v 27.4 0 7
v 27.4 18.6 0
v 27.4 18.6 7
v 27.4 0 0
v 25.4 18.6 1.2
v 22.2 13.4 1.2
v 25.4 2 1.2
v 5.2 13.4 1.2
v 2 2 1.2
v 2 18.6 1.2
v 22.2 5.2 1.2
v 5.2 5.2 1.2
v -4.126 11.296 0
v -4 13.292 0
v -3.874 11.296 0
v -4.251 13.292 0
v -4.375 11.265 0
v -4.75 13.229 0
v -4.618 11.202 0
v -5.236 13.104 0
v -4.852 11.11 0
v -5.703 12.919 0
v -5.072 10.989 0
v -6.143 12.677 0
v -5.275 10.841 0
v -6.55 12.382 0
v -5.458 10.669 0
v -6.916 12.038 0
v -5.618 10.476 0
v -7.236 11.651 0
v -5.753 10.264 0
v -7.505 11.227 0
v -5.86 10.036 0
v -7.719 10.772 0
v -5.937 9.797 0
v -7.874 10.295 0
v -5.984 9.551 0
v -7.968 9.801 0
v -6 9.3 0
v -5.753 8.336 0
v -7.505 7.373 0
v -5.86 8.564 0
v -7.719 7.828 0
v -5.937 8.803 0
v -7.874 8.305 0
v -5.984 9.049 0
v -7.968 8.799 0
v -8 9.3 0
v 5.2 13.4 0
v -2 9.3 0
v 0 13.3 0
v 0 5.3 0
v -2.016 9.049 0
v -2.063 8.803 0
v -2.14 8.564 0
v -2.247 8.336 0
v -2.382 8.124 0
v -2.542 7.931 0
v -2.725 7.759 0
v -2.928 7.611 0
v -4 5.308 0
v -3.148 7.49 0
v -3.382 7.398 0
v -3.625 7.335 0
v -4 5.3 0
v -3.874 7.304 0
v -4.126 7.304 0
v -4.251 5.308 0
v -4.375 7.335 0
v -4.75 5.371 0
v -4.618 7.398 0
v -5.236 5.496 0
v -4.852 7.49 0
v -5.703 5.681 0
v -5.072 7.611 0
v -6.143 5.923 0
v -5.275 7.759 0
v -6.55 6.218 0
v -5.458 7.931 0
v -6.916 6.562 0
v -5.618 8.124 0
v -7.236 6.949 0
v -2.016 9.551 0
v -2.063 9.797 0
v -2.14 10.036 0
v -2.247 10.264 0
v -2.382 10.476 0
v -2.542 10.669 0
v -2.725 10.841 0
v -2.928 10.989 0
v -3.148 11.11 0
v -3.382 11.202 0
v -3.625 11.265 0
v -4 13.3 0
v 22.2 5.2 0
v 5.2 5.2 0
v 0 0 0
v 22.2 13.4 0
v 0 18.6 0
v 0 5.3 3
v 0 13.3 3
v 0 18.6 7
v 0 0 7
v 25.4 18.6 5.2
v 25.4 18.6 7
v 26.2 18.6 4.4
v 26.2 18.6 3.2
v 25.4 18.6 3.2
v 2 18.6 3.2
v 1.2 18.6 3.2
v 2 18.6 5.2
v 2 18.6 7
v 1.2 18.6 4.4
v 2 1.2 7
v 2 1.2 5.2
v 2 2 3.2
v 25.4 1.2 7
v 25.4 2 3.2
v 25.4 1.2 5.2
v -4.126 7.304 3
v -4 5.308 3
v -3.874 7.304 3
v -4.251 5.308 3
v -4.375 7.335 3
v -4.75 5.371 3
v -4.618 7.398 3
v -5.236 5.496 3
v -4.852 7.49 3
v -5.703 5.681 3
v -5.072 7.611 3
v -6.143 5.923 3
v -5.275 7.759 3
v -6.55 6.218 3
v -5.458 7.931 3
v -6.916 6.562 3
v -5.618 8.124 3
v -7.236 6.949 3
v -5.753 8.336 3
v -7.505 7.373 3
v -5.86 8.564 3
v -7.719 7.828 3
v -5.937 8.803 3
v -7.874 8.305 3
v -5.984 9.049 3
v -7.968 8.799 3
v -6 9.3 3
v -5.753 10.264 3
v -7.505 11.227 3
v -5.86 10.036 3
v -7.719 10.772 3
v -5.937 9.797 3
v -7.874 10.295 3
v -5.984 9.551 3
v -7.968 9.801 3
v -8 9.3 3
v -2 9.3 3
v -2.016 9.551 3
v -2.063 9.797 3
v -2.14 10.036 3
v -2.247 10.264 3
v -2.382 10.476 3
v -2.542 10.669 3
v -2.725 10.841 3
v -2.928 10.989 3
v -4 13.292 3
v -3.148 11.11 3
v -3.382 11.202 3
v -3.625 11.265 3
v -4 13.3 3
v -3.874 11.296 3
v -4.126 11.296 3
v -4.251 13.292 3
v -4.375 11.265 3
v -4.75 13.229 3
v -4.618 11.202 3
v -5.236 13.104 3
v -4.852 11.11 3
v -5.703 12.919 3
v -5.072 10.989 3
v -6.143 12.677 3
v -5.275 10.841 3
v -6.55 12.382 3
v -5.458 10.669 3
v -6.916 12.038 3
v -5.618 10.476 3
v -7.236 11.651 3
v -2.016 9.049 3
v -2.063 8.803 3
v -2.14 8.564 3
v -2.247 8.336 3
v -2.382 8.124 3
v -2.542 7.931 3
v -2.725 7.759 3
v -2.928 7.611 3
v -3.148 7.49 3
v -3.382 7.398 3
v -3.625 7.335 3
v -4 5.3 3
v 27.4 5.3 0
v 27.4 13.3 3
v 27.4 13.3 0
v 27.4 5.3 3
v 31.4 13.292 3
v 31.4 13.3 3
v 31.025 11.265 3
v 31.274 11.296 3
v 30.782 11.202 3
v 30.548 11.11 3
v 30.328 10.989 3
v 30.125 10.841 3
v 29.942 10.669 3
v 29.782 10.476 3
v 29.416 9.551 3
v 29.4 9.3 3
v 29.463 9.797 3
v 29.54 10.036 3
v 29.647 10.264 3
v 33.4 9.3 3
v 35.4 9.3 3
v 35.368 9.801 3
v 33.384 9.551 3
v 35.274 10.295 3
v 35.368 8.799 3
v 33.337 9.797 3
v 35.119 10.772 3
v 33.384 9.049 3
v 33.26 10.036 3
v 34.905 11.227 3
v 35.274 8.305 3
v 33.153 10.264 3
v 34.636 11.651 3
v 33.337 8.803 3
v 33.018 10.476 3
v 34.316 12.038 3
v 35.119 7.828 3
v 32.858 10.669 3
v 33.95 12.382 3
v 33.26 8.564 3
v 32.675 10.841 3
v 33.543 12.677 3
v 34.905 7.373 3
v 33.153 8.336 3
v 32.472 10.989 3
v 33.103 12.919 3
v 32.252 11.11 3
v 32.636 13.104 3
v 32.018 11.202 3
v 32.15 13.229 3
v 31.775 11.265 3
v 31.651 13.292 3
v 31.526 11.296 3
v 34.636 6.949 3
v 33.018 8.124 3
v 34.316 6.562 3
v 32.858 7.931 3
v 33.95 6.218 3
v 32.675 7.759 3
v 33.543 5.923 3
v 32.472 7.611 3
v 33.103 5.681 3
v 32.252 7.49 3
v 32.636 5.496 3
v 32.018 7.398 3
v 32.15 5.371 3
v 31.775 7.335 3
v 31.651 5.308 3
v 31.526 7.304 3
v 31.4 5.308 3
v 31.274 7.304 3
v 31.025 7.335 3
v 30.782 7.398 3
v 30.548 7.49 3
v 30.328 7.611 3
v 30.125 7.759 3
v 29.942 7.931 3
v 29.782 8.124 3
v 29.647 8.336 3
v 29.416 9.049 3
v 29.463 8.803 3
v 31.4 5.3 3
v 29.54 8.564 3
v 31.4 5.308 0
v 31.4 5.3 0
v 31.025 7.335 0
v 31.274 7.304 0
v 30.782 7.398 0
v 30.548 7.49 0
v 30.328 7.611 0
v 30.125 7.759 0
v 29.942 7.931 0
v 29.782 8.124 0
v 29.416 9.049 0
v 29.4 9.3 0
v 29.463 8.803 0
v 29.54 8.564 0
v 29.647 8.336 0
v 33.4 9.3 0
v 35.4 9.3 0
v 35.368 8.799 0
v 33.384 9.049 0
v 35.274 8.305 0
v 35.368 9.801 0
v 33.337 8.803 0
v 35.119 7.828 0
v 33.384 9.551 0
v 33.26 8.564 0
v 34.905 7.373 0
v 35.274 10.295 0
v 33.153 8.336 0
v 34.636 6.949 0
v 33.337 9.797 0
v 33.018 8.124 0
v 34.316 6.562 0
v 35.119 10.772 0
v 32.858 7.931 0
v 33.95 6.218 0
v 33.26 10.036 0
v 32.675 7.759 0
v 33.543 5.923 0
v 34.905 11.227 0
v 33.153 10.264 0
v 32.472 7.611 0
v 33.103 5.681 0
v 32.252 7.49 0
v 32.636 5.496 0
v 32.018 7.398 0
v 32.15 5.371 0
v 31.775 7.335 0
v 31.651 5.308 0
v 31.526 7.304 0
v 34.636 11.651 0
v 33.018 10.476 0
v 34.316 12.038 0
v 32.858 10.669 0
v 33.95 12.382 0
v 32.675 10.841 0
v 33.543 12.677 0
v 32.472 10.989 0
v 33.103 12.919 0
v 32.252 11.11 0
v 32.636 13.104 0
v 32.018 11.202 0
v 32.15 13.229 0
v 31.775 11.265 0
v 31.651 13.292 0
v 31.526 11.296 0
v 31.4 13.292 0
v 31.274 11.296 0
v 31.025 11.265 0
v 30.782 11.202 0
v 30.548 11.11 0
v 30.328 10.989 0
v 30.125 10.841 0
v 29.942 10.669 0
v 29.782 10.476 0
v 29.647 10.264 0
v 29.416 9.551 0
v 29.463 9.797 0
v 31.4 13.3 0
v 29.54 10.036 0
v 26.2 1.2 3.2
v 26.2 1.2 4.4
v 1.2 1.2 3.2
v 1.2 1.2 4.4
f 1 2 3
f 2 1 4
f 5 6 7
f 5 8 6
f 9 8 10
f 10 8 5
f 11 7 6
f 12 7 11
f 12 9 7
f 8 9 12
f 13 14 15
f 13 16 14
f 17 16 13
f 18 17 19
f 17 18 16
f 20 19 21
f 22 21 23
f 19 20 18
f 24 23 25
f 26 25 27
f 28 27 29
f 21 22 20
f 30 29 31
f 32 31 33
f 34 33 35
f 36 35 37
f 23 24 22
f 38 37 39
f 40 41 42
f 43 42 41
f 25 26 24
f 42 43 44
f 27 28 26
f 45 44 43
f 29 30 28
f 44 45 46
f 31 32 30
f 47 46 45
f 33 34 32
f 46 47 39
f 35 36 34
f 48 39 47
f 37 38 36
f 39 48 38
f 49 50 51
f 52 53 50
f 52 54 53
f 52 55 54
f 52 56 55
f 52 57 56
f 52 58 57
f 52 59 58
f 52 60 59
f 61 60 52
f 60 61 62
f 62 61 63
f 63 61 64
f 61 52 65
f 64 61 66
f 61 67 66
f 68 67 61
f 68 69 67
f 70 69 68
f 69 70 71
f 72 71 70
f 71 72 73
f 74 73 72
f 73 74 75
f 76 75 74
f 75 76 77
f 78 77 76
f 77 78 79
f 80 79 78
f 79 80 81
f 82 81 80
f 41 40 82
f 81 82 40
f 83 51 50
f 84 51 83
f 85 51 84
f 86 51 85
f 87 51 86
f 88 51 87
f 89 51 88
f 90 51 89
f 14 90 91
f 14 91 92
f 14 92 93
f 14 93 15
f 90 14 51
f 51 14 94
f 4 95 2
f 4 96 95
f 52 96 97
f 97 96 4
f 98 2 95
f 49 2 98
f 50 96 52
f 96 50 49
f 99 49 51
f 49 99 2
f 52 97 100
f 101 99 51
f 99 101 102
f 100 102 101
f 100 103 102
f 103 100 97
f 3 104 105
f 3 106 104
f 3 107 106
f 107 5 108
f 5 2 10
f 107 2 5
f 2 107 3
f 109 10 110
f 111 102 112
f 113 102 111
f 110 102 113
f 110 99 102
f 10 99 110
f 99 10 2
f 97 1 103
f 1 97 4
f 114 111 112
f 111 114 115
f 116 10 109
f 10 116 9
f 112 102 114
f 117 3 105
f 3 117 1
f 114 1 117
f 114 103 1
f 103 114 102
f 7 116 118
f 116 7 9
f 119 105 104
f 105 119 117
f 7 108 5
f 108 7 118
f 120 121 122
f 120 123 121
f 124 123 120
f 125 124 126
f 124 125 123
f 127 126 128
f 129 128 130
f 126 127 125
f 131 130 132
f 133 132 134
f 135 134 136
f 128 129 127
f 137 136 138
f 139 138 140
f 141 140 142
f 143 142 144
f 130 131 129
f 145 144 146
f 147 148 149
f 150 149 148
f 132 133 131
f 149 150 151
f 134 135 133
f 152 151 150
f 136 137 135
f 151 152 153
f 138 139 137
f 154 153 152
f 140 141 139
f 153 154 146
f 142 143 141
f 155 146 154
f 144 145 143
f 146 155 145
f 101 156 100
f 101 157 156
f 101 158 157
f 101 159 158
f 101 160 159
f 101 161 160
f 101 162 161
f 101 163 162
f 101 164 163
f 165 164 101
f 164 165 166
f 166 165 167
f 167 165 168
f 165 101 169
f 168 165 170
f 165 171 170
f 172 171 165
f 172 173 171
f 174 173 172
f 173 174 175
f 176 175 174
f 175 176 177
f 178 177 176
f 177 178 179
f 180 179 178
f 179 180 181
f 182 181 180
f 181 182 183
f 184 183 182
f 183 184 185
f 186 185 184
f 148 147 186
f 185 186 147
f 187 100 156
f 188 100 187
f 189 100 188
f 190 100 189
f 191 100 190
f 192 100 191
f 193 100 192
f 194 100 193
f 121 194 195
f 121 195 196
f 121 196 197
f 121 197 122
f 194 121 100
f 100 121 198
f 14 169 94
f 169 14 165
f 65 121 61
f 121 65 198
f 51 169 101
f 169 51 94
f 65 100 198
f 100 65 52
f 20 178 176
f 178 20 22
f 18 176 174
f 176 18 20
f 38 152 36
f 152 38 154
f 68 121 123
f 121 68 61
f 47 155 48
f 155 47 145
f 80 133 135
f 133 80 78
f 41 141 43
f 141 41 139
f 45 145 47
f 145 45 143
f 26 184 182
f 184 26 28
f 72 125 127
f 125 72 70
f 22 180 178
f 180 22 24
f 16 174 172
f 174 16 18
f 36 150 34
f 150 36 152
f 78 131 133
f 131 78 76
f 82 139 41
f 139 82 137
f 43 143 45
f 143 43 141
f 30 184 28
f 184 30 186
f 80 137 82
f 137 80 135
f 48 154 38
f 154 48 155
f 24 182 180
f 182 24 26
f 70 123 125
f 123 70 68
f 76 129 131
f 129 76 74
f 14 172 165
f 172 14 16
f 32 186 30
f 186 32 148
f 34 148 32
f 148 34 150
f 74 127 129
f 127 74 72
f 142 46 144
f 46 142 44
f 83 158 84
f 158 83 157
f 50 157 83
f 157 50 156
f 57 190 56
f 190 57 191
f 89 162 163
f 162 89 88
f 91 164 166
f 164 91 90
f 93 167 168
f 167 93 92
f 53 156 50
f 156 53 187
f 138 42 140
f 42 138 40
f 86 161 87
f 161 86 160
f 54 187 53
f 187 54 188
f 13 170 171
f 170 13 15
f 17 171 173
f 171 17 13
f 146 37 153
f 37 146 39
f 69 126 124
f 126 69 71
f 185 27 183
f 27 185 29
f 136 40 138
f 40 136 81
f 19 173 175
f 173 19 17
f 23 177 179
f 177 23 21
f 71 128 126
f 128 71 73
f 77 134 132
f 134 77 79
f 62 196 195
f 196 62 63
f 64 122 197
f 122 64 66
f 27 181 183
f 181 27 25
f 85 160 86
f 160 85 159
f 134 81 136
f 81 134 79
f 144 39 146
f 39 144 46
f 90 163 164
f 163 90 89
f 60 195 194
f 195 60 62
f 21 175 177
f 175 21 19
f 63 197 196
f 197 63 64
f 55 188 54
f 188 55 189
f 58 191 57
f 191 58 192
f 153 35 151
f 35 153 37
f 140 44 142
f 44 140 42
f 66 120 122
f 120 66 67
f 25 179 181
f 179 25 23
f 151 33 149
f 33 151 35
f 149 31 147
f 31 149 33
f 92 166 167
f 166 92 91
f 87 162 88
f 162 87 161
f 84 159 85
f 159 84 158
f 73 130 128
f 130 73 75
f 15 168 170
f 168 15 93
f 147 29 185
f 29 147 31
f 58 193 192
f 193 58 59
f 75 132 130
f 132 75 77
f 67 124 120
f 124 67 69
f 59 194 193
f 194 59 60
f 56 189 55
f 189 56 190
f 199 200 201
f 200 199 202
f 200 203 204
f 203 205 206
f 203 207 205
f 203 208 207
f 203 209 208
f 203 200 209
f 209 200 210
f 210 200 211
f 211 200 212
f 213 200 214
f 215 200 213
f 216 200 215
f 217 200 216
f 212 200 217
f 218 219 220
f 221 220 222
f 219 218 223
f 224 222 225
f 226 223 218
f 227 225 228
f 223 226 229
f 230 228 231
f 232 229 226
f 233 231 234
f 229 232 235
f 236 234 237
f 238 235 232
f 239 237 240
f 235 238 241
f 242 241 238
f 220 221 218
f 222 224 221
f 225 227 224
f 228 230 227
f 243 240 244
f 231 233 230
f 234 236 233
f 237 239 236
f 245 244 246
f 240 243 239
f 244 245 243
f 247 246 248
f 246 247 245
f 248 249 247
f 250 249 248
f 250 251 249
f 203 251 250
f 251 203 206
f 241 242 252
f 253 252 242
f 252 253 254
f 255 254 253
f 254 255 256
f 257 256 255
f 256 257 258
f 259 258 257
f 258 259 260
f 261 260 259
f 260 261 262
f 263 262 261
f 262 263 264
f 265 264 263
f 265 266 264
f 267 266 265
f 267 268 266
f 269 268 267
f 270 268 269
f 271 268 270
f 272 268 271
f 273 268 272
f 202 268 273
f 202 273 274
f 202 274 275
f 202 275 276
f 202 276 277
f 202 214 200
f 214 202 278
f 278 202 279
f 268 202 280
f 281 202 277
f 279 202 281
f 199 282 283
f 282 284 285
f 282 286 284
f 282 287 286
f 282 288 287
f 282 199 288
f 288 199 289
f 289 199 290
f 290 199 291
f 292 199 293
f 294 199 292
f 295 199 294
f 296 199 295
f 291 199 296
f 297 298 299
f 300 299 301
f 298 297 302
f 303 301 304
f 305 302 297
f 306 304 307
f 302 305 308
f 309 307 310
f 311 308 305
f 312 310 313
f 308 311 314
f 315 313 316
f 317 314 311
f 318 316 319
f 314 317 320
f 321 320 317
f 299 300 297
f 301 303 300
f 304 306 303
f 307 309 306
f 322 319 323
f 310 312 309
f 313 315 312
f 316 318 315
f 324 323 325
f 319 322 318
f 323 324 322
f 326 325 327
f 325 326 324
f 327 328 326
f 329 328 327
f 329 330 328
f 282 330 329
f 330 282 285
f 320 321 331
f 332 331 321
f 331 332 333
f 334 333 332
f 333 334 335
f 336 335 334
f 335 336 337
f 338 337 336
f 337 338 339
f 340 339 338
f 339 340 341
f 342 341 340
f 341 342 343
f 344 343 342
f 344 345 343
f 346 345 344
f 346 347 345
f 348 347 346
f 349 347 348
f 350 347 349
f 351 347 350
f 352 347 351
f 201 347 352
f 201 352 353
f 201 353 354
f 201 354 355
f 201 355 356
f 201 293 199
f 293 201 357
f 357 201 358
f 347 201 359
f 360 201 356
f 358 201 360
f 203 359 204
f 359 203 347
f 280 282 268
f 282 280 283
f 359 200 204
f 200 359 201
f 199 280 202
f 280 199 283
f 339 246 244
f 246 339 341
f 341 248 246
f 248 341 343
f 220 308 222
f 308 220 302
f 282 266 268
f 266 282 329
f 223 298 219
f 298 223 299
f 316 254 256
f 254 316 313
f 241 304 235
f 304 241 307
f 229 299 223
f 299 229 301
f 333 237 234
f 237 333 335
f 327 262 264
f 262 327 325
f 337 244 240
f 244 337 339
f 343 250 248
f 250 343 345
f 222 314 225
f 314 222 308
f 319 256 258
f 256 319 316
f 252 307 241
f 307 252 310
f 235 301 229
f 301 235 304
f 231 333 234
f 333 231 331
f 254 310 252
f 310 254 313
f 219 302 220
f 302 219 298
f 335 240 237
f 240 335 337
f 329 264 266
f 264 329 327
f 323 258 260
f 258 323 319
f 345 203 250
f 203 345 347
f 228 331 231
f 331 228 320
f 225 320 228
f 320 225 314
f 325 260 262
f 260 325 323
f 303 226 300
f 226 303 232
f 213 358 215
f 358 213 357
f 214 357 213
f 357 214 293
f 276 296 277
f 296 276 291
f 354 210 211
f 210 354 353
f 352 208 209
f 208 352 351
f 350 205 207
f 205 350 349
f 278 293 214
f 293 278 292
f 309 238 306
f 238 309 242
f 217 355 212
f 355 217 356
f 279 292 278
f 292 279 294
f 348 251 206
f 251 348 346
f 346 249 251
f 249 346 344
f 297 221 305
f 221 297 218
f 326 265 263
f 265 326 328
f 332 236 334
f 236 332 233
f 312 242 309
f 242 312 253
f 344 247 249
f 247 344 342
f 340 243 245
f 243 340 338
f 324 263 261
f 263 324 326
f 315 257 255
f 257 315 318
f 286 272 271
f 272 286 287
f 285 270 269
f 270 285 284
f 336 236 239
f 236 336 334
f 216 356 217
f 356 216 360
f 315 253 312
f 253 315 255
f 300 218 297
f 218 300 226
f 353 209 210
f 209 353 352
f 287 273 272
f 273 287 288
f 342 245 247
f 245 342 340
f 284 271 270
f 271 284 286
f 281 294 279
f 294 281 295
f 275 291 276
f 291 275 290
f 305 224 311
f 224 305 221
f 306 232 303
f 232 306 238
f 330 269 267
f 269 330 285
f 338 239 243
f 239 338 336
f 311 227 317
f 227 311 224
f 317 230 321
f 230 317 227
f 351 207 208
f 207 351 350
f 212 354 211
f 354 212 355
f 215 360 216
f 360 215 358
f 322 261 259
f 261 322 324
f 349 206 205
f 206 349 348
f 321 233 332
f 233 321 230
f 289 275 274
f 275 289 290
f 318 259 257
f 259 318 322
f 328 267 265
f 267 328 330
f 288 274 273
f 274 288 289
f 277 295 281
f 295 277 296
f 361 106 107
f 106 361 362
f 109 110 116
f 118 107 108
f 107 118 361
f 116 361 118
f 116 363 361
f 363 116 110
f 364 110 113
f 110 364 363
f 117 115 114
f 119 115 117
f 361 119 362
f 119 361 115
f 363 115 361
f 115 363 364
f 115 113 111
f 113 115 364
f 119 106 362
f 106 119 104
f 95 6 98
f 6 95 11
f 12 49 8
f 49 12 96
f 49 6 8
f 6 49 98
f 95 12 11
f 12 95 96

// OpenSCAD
// file: ../lib/pcb_led_cvf.scad
// for led power module modified

/* bluetooth_mate_holder.scad
 * By John Biehler - November 17, 2011
 * http://www.thingiverse.com/thing:

 * derived from pcb_box_slide_with_tabs.scad
 * By Nicholas C Lewis - Jan 1, 2011
 * http://www.thingiverse.com/thing:5396
 *
 * derived from pcb_box_slide.scad
 *     Parametric, open PCB-box (slide-in) by chlunde
 *     http://www.thingiverse.com/thing:4071
 *
 * CHANGES
 * - adjusted to fit Arduino Mega
 * - added mounting tabs
 * - turned off cutouts
 * - adjusted bottom cutout size
 */

$fn=50;

module pcb_led_cvf(

	pcb_width = 48.2,
	pcb_length =24.1,
	pcb_height =1.1,
	slisse = 0.8,

	pcb_bottom_margin = 1,
	wall_width_thick = 2,
	box_height = 7,

	//tab parameters
	tab_hole_radius=2,
	tab_outer_radius=4,

	inner_margin = 4,

	add_tabs = true

) {
	wall_width = wall_width_thick-slisse;

module tab() {
	difference(){
		union() {
			translate([-tab_outer_radius,-tab_outer_radius,0])
			cube([tab_outer_radius,2*tab_outer_radius,wall_width_thick+1]);
			translate([-tab_outer_radius,0,0])
				cylinder(r=tab_outer_radius, h = wall_width_thick+1);
		}
		translate([-tab_outer_radius,0,0]) {
			cylinder(r= tab_hole_radius, h = wall_width_thick+5,center=true);
		}
	}

}

module box() {
	union() {
		cube([pcb_width + 2*wall_width, pcb_length + 2*wall_width, wall_width]);

		cube([wall_width_thick, pcb_length + 2*wall_width, box_height]);

		cube([pcb_width + 2*wall_width, wall_width_thick, box_height]);

		%translate([0, pcb_length+wall_width, 0])
			cube([pcb_width + 2*wall_width,wall_width,box_height]);

		translate([pcb_width + wall_width - slisse,0,0])
			cube([wall_width_thick, pcb_length + 2*wall_width, box_height]);
	}
	if(add_tabs) {
//comment out this part to remove tabs
		for(i=[(pcb_length + 2*wall_width)/2]){
	translate([0,i,0])tab();
	translate([pcb_width + 2*wall_width,i,0])mirror()tab();
		}
	}

}

module pcb() {
	translate([wall_width, wall_width, wall_width + pcb_bottom_margin])
		cube([pcb_width,pcb_length + wall_width + 0.1,pcb_height]);
	translate([wall_width, wall_width, wall_width + pcb_bottom_margin+pcb_height])rotate([0,45,0])
		cube([pcb_height,pcb_length + wall_width + 0.1,pcb_height]);
	translate([wall_width+pcb_width-2*cos(45)*pcb_height, wall_width, wall_width + pcb_bottom_margin+pcb_height])rotate([0,45,0])
		cube([pcb_height,pcb_length + wall_width + 0.1,pcb_height]);
	translate([wall_width_thick, wall_width, wall_width + pcb_bottom_margin])
		cube([pcb_width-2*slisse,pcb_length + wall_width + 0.1,box_height]);

}



module holes() {
		*translate([wall_width + pcb_width/2, wall_width_thick + 0.1, pcb_width/2+wall_width])
			rotate(a=90,v=[1,0,0])
				cylinder(r=pcb_width/2, h=wall_width_thick + 0.2);

		*translate([-0.1, wall_width + pcb_length/2, pcb_length/2 + wall_width])
			rotate(a=90,v=[0,1,0])
				cylinder(r=pcb_length/2, h=wall_width_thick + 0.2);

		*translate([pcb_width + wall_width - slisse - 0.1, wall_width + pcb_length/2, pcb_length/2 + wall_width])
			rotate(a=90,v=[0,1,0])
				cylinder(r=pcb_length/2, h=wall_width_thick + 0.2);

	 * translate([pcb_width/2 + wall_width, wall_width + pcb_length/2, -0.1])
			rotate(a=0,v=[0,1,0])
				cylinder(r=min(pcb_length,pcb_width)/2 - wall_width/2, h=wall_width_thick + 0.2);

		translate([inner_margin +wall_width, inner_margin+wall_width, -0.1])
			cube([pcb_width-inner_margin*2,pcb_length -inner_margin*2,wall_width + 0.2]);
}

	difference() {
		box();
		pcb();
		holes();
	}
}



pcb_led_cvf();
// main file
use <../lib/pcb_led_cvf.scad>

$fn = 50;

pcb_led_cvf(
  pcb_length=16.2,
  pcb_width=25,
  pcb_height=1.2,
  pcb_bottom_margin=2
);
